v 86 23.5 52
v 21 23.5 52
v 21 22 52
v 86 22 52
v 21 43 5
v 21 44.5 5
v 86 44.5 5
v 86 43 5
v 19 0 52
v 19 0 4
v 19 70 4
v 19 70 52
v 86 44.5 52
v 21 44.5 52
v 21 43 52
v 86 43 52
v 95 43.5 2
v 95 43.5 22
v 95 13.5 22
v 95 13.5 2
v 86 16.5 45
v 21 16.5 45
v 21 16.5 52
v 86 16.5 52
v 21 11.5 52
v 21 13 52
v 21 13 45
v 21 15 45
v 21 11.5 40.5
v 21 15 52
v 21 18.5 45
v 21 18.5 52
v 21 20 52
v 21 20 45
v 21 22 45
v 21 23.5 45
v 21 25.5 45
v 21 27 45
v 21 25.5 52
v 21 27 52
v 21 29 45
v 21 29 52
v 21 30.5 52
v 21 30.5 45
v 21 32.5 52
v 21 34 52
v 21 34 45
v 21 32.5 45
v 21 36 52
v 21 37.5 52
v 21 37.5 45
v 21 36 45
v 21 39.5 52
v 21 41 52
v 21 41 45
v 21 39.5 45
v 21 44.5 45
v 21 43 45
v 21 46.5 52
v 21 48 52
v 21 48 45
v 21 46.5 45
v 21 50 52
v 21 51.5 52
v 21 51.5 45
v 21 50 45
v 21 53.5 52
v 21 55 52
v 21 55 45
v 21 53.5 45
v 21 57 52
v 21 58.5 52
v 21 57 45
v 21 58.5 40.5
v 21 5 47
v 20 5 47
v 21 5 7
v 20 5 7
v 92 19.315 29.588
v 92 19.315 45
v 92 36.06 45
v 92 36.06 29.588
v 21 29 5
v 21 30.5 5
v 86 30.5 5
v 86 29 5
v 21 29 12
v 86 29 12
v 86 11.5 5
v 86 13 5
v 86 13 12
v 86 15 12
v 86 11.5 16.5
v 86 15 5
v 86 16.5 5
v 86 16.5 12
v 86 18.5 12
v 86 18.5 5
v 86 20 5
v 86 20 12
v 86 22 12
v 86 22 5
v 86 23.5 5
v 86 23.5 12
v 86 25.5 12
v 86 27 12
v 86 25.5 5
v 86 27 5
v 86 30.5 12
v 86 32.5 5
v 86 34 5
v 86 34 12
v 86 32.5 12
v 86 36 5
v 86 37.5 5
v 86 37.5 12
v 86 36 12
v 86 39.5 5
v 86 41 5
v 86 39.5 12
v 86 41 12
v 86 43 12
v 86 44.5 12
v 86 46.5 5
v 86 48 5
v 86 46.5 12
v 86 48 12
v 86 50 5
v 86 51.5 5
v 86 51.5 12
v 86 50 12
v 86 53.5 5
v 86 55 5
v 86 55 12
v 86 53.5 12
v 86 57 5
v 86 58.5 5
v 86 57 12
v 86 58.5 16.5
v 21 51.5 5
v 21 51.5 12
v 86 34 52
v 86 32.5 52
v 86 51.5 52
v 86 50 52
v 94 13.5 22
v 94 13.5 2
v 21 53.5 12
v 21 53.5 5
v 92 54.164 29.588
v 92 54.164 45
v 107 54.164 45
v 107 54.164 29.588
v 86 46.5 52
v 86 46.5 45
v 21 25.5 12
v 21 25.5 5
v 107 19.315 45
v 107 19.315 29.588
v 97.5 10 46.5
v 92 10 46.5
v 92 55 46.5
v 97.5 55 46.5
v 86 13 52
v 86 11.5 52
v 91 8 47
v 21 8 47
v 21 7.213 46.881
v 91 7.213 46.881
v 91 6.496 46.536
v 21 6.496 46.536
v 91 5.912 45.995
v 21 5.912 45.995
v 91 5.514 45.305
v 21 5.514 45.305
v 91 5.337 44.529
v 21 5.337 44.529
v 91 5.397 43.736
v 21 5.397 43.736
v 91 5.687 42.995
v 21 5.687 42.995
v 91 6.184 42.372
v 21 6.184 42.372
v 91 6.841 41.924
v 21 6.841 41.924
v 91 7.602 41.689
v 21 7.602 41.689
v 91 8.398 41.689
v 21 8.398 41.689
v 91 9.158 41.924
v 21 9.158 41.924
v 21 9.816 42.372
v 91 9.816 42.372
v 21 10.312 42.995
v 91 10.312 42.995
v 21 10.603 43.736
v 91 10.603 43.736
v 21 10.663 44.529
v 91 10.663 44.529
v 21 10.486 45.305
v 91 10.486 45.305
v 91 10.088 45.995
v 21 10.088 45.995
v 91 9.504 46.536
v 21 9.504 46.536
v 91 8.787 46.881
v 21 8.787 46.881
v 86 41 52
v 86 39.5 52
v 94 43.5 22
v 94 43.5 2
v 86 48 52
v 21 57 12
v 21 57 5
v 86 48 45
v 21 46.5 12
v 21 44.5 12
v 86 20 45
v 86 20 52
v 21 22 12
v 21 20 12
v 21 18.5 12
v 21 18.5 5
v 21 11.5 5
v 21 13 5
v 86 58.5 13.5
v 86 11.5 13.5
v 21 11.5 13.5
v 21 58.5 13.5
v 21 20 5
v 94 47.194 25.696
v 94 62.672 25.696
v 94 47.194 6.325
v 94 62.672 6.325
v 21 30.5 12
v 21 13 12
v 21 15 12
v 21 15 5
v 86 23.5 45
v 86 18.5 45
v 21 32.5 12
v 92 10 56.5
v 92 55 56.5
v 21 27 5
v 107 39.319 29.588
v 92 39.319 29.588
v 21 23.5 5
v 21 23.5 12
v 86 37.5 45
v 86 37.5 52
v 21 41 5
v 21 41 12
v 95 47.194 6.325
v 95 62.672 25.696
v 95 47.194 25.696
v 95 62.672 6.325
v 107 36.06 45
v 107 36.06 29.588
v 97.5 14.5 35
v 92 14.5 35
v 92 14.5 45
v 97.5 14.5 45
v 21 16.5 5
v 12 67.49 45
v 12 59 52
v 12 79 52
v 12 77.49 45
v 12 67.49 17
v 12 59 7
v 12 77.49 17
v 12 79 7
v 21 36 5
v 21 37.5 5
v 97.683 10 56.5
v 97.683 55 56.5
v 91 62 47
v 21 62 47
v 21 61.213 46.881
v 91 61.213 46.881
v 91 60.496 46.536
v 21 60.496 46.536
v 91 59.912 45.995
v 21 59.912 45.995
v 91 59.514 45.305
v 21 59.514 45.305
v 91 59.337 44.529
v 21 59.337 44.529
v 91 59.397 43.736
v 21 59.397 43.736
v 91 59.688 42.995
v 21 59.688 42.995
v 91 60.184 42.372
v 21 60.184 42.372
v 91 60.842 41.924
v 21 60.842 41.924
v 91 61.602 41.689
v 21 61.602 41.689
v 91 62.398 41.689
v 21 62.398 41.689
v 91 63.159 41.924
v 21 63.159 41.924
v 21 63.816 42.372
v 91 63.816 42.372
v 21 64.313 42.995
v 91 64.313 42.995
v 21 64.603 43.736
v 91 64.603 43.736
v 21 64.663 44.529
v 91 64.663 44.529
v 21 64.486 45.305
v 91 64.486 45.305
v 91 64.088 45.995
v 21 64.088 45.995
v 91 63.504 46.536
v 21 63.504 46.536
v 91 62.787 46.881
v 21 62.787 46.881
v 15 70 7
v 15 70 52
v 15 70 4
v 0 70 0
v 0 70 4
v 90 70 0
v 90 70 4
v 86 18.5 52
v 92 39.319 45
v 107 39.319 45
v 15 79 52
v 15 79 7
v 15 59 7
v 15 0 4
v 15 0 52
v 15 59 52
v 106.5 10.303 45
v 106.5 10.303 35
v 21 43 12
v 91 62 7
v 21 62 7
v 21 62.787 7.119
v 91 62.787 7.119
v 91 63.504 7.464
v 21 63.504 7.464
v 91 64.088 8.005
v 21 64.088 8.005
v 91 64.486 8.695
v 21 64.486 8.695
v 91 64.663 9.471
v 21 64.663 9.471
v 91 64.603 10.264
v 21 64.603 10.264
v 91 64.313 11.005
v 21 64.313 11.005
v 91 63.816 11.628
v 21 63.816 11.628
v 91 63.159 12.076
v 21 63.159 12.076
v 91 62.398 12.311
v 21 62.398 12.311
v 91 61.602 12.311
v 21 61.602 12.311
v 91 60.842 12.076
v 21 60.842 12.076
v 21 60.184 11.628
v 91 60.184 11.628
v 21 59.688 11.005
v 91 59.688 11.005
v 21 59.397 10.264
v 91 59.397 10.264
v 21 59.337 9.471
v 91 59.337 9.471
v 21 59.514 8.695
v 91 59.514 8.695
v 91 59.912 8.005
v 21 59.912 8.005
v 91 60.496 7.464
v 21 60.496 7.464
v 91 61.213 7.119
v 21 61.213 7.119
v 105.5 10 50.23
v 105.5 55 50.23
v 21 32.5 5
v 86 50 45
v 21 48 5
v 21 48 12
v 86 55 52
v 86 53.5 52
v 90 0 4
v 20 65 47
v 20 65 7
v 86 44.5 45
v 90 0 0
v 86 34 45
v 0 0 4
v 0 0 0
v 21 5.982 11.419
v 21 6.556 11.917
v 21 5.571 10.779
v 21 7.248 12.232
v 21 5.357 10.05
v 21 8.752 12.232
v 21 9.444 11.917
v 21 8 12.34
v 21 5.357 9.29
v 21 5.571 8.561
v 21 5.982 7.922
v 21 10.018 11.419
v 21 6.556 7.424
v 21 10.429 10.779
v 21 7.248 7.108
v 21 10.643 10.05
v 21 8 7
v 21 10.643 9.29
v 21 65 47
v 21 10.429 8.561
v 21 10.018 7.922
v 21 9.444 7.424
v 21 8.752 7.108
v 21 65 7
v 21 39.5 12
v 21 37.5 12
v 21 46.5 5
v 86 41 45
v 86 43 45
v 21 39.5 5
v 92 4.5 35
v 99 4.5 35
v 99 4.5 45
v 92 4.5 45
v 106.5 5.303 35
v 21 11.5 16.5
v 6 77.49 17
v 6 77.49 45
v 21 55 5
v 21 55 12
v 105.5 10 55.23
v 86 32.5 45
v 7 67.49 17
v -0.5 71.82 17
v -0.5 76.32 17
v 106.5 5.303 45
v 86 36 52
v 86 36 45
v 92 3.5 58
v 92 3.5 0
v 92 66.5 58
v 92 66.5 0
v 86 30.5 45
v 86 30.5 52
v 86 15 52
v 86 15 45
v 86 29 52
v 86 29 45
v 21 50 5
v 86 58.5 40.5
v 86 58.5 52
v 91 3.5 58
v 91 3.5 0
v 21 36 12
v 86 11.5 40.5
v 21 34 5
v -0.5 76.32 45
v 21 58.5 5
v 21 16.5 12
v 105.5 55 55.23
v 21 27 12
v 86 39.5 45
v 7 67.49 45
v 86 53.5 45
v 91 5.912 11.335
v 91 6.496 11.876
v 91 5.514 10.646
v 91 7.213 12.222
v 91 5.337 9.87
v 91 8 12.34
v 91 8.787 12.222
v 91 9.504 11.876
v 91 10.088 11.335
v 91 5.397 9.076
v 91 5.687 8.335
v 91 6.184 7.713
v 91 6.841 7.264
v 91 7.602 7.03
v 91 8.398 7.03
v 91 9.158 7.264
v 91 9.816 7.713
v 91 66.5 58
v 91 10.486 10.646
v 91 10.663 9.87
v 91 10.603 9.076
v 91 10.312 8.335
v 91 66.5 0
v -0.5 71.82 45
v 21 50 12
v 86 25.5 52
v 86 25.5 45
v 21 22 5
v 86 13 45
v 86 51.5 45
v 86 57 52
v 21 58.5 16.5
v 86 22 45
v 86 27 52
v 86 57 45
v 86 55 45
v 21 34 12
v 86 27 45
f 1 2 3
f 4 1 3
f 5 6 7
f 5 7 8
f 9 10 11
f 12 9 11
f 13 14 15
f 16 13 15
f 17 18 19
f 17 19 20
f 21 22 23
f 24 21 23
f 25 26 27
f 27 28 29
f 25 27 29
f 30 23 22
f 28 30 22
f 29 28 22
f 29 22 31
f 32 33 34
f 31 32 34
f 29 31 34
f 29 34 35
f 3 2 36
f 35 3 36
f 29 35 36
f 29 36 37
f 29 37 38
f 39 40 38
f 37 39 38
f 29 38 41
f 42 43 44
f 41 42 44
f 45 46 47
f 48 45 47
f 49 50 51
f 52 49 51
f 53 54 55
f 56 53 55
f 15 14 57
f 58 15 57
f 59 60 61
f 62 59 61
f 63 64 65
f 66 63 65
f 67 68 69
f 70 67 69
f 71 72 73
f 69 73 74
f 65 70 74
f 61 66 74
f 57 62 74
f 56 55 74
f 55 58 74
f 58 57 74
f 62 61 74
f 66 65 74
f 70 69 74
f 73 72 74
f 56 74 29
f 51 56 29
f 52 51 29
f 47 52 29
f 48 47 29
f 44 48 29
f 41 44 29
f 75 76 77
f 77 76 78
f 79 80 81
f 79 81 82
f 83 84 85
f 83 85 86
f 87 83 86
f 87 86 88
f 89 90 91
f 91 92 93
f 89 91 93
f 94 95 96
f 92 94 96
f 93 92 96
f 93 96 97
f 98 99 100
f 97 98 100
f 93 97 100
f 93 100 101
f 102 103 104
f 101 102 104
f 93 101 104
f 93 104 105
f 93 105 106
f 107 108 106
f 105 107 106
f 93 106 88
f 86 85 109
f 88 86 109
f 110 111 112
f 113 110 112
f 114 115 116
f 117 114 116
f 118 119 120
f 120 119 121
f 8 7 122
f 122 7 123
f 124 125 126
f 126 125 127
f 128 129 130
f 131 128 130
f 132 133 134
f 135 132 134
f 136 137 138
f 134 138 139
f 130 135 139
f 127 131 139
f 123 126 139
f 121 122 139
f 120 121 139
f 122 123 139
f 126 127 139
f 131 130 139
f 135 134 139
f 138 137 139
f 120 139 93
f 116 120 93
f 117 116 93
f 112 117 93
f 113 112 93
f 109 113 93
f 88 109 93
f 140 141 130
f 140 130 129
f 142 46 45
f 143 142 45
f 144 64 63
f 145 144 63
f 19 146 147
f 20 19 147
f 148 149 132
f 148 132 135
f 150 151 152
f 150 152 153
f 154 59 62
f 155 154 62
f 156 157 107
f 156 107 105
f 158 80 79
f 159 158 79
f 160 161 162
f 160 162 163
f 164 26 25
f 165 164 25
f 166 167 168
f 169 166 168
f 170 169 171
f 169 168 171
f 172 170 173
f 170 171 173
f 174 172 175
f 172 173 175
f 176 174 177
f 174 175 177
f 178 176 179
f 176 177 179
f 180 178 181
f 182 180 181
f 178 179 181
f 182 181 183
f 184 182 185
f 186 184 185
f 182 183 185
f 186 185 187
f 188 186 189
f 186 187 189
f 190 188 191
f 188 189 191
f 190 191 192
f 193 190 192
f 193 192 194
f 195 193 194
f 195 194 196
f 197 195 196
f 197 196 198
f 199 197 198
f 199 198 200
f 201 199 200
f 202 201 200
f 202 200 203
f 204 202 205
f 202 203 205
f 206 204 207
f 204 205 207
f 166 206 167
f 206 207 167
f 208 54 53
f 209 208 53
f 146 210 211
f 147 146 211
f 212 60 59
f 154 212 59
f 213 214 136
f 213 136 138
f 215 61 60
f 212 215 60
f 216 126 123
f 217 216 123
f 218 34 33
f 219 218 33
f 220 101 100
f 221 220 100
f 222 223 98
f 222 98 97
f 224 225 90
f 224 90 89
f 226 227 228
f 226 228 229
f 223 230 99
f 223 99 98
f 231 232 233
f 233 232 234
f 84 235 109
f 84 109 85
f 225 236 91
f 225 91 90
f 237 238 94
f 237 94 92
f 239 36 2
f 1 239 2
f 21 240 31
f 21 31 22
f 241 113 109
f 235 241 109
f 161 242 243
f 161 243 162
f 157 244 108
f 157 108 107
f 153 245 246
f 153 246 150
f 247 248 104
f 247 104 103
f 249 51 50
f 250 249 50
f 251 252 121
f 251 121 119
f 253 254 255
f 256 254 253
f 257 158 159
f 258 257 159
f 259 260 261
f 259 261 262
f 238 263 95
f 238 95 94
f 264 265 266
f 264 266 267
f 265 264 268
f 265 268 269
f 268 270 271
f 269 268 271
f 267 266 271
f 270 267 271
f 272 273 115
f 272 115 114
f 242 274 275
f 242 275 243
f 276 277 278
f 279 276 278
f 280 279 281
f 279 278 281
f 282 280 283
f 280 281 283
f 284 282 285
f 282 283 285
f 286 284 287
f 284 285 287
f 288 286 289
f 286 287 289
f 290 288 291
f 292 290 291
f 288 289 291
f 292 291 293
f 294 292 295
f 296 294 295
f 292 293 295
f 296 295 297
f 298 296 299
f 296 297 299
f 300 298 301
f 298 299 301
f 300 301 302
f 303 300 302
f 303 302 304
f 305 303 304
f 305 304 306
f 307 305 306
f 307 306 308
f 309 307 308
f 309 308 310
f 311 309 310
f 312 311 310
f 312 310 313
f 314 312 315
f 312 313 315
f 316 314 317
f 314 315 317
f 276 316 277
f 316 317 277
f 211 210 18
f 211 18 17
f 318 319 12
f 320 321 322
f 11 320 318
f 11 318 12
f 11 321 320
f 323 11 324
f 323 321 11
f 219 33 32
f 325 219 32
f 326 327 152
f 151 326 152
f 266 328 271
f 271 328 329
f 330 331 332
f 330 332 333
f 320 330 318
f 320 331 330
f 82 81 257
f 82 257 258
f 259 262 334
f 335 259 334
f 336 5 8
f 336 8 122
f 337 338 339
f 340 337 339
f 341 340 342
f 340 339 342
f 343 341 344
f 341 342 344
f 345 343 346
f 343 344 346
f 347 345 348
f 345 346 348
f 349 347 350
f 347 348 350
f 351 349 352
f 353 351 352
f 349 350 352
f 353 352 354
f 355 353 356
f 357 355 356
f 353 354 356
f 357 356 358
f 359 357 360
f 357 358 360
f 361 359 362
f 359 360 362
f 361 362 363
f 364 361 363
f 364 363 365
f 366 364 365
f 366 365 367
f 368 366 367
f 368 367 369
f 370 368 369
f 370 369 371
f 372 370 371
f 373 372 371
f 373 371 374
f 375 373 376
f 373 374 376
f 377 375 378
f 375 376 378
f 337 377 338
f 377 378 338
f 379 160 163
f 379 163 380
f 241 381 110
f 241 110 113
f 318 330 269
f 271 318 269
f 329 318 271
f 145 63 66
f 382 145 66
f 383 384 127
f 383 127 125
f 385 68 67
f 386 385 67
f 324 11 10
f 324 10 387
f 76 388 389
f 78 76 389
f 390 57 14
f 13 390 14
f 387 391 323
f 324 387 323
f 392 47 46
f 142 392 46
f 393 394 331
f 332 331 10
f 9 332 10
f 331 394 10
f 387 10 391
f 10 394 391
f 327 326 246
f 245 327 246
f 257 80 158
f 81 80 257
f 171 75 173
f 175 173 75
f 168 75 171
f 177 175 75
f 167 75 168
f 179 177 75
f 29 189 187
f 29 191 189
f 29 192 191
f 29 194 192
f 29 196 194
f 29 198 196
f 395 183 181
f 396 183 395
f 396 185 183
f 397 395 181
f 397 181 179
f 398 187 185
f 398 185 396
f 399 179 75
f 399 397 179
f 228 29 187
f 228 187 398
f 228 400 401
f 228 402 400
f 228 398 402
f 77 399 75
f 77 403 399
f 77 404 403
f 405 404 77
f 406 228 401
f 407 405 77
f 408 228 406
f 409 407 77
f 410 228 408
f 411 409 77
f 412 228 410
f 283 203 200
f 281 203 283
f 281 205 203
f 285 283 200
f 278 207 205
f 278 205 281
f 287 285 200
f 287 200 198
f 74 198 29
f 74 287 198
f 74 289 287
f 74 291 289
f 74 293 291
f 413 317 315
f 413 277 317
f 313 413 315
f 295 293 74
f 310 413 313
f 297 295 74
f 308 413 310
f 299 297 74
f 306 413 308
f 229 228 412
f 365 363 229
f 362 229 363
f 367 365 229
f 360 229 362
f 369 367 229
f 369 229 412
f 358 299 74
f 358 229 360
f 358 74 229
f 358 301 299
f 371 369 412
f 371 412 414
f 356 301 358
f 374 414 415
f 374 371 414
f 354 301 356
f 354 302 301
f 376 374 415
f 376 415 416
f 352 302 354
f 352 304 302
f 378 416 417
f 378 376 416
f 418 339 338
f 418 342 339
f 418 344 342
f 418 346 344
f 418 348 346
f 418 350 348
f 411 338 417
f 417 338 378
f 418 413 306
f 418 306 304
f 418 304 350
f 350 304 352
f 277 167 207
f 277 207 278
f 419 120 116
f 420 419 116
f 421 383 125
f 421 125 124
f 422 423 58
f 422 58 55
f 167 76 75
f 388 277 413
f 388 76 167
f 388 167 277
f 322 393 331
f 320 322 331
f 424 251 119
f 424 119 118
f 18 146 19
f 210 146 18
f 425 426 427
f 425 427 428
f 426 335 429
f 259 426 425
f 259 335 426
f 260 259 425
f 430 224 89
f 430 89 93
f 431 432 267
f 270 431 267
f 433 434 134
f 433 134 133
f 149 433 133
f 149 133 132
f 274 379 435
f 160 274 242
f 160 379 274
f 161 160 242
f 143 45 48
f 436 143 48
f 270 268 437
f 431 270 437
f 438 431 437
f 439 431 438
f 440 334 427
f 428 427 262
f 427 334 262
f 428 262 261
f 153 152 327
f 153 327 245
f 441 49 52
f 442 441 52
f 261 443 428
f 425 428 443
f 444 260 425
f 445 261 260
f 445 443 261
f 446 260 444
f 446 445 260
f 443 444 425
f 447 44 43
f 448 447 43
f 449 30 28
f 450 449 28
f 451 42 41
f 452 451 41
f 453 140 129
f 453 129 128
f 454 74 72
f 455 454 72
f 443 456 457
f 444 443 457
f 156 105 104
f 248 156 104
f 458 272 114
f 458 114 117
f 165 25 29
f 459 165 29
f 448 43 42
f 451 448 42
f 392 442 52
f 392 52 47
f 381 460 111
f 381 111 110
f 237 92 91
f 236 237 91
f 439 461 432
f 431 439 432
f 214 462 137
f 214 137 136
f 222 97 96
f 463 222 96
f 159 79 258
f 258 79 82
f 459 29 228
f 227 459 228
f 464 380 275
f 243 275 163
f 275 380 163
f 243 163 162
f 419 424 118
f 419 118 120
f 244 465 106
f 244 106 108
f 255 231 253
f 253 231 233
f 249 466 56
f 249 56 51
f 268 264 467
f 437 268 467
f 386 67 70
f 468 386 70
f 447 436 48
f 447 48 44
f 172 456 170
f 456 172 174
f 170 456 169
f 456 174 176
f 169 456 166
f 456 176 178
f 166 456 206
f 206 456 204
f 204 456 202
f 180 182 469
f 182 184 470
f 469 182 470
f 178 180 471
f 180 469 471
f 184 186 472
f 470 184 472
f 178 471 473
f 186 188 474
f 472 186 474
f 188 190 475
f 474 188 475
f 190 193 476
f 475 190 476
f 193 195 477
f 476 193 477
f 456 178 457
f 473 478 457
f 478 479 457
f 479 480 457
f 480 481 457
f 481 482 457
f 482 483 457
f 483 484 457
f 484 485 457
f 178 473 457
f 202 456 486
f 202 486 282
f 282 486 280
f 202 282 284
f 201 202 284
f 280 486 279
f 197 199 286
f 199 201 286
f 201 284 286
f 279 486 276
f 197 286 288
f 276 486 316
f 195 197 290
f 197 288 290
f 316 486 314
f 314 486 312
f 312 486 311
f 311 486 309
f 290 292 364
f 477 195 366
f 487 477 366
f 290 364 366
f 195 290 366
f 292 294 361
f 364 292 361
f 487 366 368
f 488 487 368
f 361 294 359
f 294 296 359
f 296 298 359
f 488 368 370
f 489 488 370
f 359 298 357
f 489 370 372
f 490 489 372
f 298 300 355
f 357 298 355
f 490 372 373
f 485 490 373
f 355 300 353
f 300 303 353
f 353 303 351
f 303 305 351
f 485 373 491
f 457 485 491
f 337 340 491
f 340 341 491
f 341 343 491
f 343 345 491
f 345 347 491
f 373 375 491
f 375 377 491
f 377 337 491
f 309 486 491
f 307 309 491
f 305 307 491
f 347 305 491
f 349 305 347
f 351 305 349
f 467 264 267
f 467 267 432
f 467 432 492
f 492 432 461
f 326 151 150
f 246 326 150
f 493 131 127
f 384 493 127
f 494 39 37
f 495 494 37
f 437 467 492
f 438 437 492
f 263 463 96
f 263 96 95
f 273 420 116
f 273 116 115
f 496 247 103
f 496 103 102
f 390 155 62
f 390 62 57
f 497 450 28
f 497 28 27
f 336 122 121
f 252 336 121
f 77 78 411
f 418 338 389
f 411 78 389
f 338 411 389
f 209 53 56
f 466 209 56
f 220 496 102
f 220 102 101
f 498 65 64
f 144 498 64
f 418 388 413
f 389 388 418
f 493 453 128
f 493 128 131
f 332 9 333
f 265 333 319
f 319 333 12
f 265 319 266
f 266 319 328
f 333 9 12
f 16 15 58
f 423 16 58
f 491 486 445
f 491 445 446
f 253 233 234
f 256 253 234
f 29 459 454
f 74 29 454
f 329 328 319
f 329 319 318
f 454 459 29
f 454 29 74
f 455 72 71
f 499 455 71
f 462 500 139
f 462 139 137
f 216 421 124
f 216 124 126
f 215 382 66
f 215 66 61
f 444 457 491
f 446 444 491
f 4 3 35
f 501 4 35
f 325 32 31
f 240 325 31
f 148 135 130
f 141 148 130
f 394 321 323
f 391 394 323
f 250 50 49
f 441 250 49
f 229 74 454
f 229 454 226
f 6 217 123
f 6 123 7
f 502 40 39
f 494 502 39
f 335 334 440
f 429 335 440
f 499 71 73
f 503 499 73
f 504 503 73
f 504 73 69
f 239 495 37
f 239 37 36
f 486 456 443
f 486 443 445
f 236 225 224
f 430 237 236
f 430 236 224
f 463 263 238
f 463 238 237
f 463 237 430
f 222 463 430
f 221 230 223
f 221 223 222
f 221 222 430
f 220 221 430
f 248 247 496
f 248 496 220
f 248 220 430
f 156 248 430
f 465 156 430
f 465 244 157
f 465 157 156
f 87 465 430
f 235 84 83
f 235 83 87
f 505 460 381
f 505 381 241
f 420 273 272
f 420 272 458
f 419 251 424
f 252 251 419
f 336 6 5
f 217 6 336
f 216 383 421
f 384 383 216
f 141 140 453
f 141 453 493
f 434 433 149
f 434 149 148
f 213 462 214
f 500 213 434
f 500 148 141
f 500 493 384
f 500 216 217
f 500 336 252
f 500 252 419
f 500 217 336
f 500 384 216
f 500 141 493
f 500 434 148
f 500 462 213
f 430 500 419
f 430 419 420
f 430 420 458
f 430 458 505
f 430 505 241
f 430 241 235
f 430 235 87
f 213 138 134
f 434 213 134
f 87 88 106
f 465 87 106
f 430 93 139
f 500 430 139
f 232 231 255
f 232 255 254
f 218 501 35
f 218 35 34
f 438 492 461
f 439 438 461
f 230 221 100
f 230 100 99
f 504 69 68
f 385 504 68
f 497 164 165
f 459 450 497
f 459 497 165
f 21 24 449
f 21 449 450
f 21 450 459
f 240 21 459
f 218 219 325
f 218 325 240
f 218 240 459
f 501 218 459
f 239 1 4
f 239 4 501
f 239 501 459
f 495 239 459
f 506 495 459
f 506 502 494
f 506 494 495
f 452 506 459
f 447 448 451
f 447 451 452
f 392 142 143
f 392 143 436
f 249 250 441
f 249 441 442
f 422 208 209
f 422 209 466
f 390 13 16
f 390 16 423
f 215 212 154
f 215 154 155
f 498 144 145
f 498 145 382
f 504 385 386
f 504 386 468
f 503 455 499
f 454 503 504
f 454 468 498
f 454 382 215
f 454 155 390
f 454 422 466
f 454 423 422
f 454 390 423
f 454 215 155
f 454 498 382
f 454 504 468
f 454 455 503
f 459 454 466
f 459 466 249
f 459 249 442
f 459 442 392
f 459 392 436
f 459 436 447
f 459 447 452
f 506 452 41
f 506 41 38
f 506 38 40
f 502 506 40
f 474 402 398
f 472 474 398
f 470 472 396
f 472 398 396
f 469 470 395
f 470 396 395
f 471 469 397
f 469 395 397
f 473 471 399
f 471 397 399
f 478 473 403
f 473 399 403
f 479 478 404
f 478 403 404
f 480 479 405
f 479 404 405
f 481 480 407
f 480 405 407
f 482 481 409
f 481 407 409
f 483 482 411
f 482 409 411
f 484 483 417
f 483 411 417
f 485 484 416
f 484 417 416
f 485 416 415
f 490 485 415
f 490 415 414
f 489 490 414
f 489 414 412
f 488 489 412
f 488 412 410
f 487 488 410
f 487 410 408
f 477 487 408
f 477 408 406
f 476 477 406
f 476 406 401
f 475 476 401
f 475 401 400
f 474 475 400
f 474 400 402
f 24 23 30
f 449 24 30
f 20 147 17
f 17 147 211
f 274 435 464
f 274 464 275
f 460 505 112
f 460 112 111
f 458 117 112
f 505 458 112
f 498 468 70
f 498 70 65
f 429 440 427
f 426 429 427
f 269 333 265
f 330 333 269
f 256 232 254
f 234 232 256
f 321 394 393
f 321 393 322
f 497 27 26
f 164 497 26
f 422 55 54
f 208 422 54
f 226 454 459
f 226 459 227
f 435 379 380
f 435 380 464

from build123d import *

# Parameters (mm, degrees)
SKETCH2_W              = 90
SKETCH2_H              = 70
BOSS_EXTRUDE1_DEPTH    = 4
SKETCH3_W              = 4
SKETCH3_H              = 70
BOSS_EXTRUDE2_DEPTH    = 52
SKETCH4_W              = 45
SKETCH4_H              = 20
BOSS_EXTRUDE3_DEPTH    = 3
BOSS_EXTRUDE4_DEPTH    = 28
SKETCH6_W              = 40
SKETCH6_H              = 60
BOSS_EXTRUDE5_DEPTH    = 1
SKETCH7_R              = 2.670201232
BOSS_EXTRUDE6_DEPTH    = 70
SKETCH8_W              = 27
SKETCH8_H              = 47
BOSS_EXTRUDE7_DEPTH    = 65
BOSS_EXTRUDE8_DEPTH    = 65
BOSS_EXTRUDE8_2_DEPTH  = 65
SKETCH11_W             = 58
SKETCH11_H             = 63
BOSS_EXTRUDE9_DEPTH    = 1
BOSS_EXTRUDE10_DEPTH   = 45
SKETCH14_W             = 15.411636089
SKETCH14_H             = 14.844874065
BOSS_EXTRUDE11_DEPTH   = 15
SKETCH14_H_2           = 16.745742084
BOSS_EXTRUDE11_2_DEPTH = 15
BOSS_EXTRUDE12_DEPTH   = 10
SKETCH16_W             = 20
SKETCH16_H             = 30
BOSS_EXTRUDE13_DEPTH   = 1
SKETCH18_W             = 19.370750303
SKETCH18_H             = 15.478496738
BOSS_EXTRUDE14_DEPTH   = 1


with BuildPart() as part:
    # Sketch2 → Boss-Extrude1 (new body)
    with BuildSketch(Plane.XY):
        with Locations((45, 35)):
            Rectangle(SKETCH2_W, SKETCH2_H)
    extrude(amount=BOSS_EXTRUDE1_DEPTH)

    # Sketch3 → Boss-Extrude2 (add)
    with BuildSketch(Plane.XY):
        with Locations((17, 35)):
            Rectangle(SKETCH3_W, SKETCH3_H)
    extrude(amount=BOSS_EXTRUDE2_DEPTH)



with BuildPart() as body_2:
    # Sketch4 → Boss-Extrude3 (new body)
    with BuildSketch(Plane(origin=(15, 0, 0), x_dir=(0, 0, -1), z_dir=(1, 0, 0))):
        with Locations((-29.5, 69)):
            Rectangle(SKETCH4_W, SKETCH4_H)
    extrude(amount=-BOSS_EXTRUDE3_DEPTH)


with BuildPart() as part_1:
    add(part.part)

    add(body_2.part)  # Boss-Extrude4 merges body 2
    # Sketch5 → Boss-Extrude4 (add)
    with BuildSketch(Plane.XY.offset(45)):
        Polygon((12, 77.489636969), (12, 67.489636969), (7, 67.489636969), (-0.5, 71.819763988), (-0.5, 76.319763988), (6, 77.489636969), align=None)
    extrude(amount=-BOSS_EXTRUDE4_DEPTH)


with BuildPart() as body_2_2:
    # Sketch6 → Boss-Extrude5 (new body)
    with BuildSketch(Plane(origin=(20, 0, 0), x_dir=(0, 0, -1), z_dir=(1, 0, 0))):
        with Locations((-27, 35)):
            Rectangle(SKETCH6_W, SKETCH6_H)
    extrude(amount=BOSS_EXTRUDE5_DEPTH)

    # Sketch7 → Boss-Extrude6 (add)
    with BuildSketch(Plane(origin=(21, 0, 0), x_dir=(0, 0, -1), z_dir=(1, 0, 0))):
        with Locations(Location((-44.329798768, 7.999901376, 0), (0, 0, 180))):
            Circle(SKETCH7_R)
        with Locations(Location((-44.329798768, 62.000098624, 0), (0, 0, 180))):
            Circle(SKETCH7_R)
        with Locations((-9.670201232, 62.000098624)):
            Circle(SKETCH7_R)
        with Locations(Location((-9.670201232, 7.999901376, 0), (0, 0, 180))):
            Circle(SKETCH7_R)
    extrude(amount=BOSS_EXTRUDE6_DEPTH)

    # Sketch8 → Boss-Extrude7 (add)
    with BuildSketch(Plane(origin=(21, 0, 0), x_dir=(0, 0, -1), z_dir=(1, 0, 0))):
        with Locations((-27, 35)):
            Rectangle(SKETCH8_W, SKETCH8_H)
    extrude(amount=BOSS_EXTRUDE7_DEPTH)

    # Sketch11 → Boss-Extrude9 (add)
    with BuildSketch(Plane(origin=(91, 0, 0), x_dir=(0, 0, -1), z_dir=(1, 0, 0))):
        with Locations((-29, 34.999901376)):
            Rectangle(SKETCH11_W, SKETCH11_H)
    extrude(amount=BOSS_EXTRUDE9_DEPTH)

    # Sketch15 → Boss-Extrude12 (add)
    with BuildSketch(Plane.XY.offset(45)):
        Polygon((92, 4.499901376), (92, 14.499901376), (97.5, 14.499901376), (106.5, 10.303132453), (106.5, 5.303132453), (99, 4.499901376), align=None)
    extrude(amount=-BOSS_EXTRUDE12_DEPTH)


with BuildPart() as body_3:
    # Sketch10 → Boss-Extrude8 (new body)
    with BuildSketch(Plane(origin=(21, 0, 0), x_dir=(0, 0, -1), z_dir=(1, 0, 0))):
        Polygon((-45, 16.5), (-52, 16.5), (-52, 15), (-45, 15), (-45, 13), (-52, 13), (-52, 11.5), (-40.5, 11.5), (-40.5, 58.5), (-52, 58.5), (-52, 57), (-45, 57), (-45, 55), (-52, 55), (-52, 53.5), (-45, 53.5), (-45, 51.5), (-52, 51.5), (-52, 50), (-45, 50), (-45, 48), (-52, 48), (-52, 46.5), (-45, 46.5), (-45, 44.5), (-52, 44.5), (-52, 43), (-45, 43), (-45, 41), (-52, 41), (-52, 39.5), (-45, 39.5), (-45, 37.5), (-52, 37.5), (-52, 36), (-45, 36), (-45, 34), (-52, 34), (-52, 32.5), (-45, 32.5), (-45, 30.5), (-52, 30.5), (-52, 29), (-45, 29), (-45, 27), (-52, 27), (-52, 25.5), (-45, 25.5), (-45, 23.5), (-52, 23.5), (-52, 22), (-45, 22), (-45, 20), (-52, 20), (-52, 18.5), (-45, 18.5), align=None)
    extrude(amount=BOSS_EXTRUDE8_DEPTH)


with BuildPart() as body_4:
    # Sketch10 → Boss-Extrude8 2 (new body)
    with BuildSketch(Plane(origin=(21, 0, 0), x_dir=(0, 0, -1), z_dir=(1, 0, 0))):
        Polygon((-16.5, 11.5), (-16.5, 58.5), (-5, 58.5), (-5, 57), (-12, 57), (-12, 55), (-5, 55), (-5, 53.5), (-12, 53.5), (-12, 51.5), (-5, 51.5), (-5, 50), (-12, 50), (-12, 48), (-5, 48), (-5, 46.5), (-12, 46.5), (-12, 44.5), (-5, 44.5), (-5, 43), (-12, 43), (-12, 41), (-5, 41), (-5, 39.5), (-12, 39.5), (-12, 37.5), (-5, 37.5), (-5, 36), (-12, 36), (-12, 34), (-5, 34), (-5, 32.5), (-12, 32.5), (-12, 30.5), (-5, 30.5), (-5, 29), (-12, 29), (-12, 27), (-5, 27), (-5, 25.5), (-12, 25.5), (-12, 23.5), (-5, 23.5), (-5, 22), (-12, 22), (-12, 20), (-5, 20), (-5, 18.5), (-12, 18.5), (-12, 16.5), (-5, 16.5), (-5, 15), (-12, 15), (-12, 13), (-5, 13), (-5, 11.5), align=None)
    extrude(amount=BOSS_EXTRUDE8_2_DEPTH)


with BuildPart() as body_5:
    # Sketch13 → Boss-Extrude10 (new body)
    with BuildSketch(Plane(origin=(0, 10, 0), x_dir=(1, 0, 0), z_dir=(0, 1, 0))):
        Polygon((92, -56.5), (92, -46.5), (97.5, -46.5), (105.5, -50.230461265), (105.5, -55.230461265), (97.682997604, -56.5), align=None)
    extrude(amount=BOSS_EXTRUDE10_DEPTH)


with BuildPart() as body_6:
    # Sketch14 → Boss-Extrude11 (new body)
    with BuildSketch(Plane(origin=(92, 0, 0), x_dir=(0, 0, -1), z_dir=(1, 0, 0))):
        with Locations((-37.294181956, 46.741401983)):
            Rectangle(SKETCH14_W, SKETCH14_H)
    extrude(amount=BOSS_EXTRUDE11_DEPTH)


with BuildPart() as body_7:
    # Sketch14 → Boss-Extrude11 2 (new body)
    with BuildSketch(Plane(origin=(92, 0, 0), x_dir=(0, 0, -1), z_dir=(1, 0, 0))):
        with Locations((-37.294181956, 27.687463016)):
            Rectangle(SKETCH14_W, SKETCH14_H_2)
    extrude(amount=BOSS_EXTRUDE11_2_DEPTH)


with BuildPart() as body_8:
    # Sketch16 → Boss-Extrude13 (new body)
    with BuildSketch(Plane(origin=(94, 0, 0), x_dir=(0, 0, -1), z_dir=(1, 0, 0))):
        with Locations((-12, 28.499901376)):
            Rectangle(SKETCH16_W, SKETCH16_H)
    extrude(amount=BOSS_EXTRUDE13_DEPTH)


with BuildPart() as body_9:
    # Sketch18 → Boss-Extrude14 (new body)
    with BuildSketch(Plane(origin=(94, 0, 0), x_dir=(0, 0, -1), z_dir=(1, 0, 0))):
        with Locations((-16.010735194, 54.933237975)):
            Rectangle(SKETCH18_W, SKETCH18_H)
    extrude(amount=BOSS_EXTRUDE14_DEPTH)


solid = Compound([part_1.part, body_2_2.part, body_3.part, body_4.part, body_5.part, body_6.part, body_7.part, body_8.part, body_9.part])
